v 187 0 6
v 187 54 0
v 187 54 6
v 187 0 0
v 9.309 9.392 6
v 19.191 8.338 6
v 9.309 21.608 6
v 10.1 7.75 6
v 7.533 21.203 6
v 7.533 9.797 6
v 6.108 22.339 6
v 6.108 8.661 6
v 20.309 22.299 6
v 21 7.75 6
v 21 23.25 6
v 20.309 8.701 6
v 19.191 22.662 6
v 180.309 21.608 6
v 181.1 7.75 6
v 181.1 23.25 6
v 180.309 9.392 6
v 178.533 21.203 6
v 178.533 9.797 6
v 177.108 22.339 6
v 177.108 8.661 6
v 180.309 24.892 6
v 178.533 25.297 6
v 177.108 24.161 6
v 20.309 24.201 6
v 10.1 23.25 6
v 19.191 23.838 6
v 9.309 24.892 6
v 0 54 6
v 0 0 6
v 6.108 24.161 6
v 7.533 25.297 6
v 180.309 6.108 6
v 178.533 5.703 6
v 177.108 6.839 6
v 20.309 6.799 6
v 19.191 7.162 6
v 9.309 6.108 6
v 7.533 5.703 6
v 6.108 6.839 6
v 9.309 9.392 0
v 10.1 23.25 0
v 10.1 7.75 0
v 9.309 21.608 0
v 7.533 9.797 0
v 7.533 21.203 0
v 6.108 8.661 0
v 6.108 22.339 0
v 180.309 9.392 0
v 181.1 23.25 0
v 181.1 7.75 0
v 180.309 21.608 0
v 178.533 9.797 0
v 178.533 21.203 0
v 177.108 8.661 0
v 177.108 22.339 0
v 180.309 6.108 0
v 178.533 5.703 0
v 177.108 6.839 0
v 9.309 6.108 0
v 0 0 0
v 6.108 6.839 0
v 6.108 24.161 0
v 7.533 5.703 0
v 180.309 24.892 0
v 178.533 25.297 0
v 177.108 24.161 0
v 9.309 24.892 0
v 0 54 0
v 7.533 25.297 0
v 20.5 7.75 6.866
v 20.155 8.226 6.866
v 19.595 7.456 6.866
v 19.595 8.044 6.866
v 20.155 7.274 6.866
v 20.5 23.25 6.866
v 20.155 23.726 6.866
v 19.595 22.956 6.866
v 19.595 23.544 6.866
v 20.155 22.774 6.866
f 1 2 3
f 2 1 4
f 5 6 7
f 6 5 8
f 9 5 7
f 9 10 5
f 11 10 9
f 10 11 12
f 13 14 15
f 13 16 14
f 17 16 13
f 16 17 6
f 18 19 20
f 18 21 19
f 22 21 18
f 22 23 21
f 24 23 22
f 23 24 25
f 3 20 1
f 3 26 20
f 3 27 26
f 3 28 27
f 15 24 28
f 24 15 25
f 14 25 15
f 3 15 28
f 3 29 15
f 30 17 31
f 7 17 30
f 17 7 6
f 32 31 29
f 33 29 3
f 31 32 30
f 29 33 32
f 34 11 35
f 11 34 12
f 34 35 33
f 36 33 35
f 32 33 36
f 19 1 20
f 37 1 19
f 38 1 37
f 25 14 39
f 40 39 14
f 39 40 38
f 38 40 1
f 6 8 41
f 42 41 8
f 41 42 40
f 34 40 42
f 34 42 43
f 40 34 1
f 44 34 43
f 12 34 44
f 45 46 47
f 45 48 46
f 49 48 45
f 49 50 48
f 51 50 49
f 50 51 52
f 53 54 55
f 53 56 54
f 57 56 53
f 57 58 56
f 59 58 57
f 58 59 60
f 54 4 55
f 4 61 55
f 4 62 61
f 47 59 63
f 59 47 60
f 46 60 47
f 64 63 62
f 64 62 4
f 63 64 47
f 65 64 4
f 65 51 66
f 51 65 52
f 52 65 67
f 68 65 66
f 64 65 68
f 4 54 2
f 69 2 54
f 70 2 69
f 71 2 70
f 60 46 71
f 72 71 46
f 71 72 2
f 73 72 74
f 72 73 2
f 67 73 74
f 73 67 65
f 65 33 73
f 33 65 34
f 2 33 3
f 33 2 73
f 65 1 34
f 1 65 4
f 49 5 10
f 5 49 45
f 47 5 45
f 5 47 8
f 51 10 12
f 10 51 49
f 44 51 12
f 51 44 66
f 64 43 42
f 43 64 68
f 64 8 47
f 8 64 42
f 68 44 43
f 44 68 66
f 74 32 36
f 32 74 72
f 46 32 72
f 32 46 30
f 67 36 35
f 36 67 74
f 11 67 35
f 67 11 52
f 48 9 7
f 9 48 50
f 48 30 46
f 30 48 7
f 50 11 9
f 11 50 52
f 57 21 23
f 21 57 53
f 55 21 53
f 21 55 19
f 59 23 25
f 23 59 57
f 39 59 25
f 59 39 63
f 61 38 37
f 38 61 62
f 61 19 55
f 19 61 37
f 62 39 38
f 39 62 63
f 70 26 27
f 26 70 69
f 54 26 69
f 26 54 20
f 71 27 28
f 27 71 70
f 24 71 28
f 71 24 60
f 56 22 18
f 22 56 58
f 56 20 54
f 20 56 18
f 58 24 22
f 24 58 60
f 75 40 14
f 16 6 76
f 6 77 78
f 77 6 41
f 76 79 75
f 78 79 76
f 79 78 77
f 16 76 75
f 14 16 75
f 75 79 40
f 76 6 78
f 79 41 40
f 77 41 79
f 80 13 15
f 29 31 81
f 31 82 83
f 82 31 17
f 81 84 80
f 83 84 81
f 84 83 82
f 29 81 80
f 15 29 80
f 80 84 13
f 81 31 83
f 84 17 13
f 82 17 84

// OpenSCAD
// Test fix for grill hole alignment
// The issue: Grill holes are 1.35mm too low (6.4mm instead of 7.75mm)

// Let me check if there's a calculation order issue
fan_type = 50;
heatsink = 23;

echo("=== DEBUGGING GRILL HOLE ISSUE ===");

// What the calculation SHOULD produce:
correct_rail_height = (fan_type + 4) - heatsink;  // 31mm
correct_first = correct_rail_height * 0.25;       // 7.75mm
correct_second = correct_rail_height * 0.75;      // 23.25mm

echo(str("Expected first hole: ", correct_first, "mm"));
echo(str("Expected second hole: ", correct_second, "mm"));

// Your measurement shows 6.4mm, which is 1.35mm too low
measured_first = 6.4;
error = measured_first - correct_first;

echo(str("Measured first hole: ", measured_first, "mm"));
echo(str("Error: ", error, "mm (negative means too low)"));

// Check if there's a pattern:
// If first hole is at 6.4mm instead of 7.75mm
// That's a ratio of 6.4/7.75 = 0.826

ratio = measured_first / correct_first;
echo(str("Ratio: ", ratio));

// If the same ratio applies to the second hole:
predicted_second = correct_second * ratio;  // 23.25 * 0.826 = 19.2mm
echo(str("Predicted second hole based on ratio: ", predicted_second, "mm"));

// But you said the top hole is 6-8mm too HIGH
// If correct is 23.25mm and it's 6-8mm too high, that would be 29.25-31.25mm
// That doesn't match the ratio pattern

echo("\n=== HYPOTHESIS ===");
echo("The holes might be calculated from a different reference point");
echo("Or there might be a variable scope issue in the grill module");

// Let's create a fixed version
module fixed_rear_grill() {
    // Hardcoded for SCC020030200
    plate_width = 187;
    plate_length = 54;
    plate_thickness = 6;
    
    // Force correct calculation
    rail_height_fixed = 31;  // (50+4)-23
    first_hole_fixed = 7.75; // 31*0.25
    second_hole_fixed = 23.25; // 31*0.75
    
    difference() {
        cube([plate_width, plate_length, plate_thickness]);
        
        // Holes at CORRECT positions
        translate([8, first_hole_fixed, -0.5])
            cylinder(d=4.2, h=plate_thickness+1);
        translate([8, second_hole_fixed, -0.5])
            cylinder(d=4.2, h=plate_thickness+1);
            
        translate([plate_width-8, first_hole_fixed, -0.5])
            cylinder(d=4.2, h=plate_thickness+1);
        translate([plate_width-8, second_hole_fixed, -0.5])
            cylinder(d=4.2, h=plate_thickness+1);
    }
    
    // Mark the correct positions
    color("green") {
        translate([20, first_hole_fixed, 6]) sphere(d=2);
        translate([20, second_hole_fixed, 6]) sphere(d=2);
    }
}

fixed_rear_grill();
